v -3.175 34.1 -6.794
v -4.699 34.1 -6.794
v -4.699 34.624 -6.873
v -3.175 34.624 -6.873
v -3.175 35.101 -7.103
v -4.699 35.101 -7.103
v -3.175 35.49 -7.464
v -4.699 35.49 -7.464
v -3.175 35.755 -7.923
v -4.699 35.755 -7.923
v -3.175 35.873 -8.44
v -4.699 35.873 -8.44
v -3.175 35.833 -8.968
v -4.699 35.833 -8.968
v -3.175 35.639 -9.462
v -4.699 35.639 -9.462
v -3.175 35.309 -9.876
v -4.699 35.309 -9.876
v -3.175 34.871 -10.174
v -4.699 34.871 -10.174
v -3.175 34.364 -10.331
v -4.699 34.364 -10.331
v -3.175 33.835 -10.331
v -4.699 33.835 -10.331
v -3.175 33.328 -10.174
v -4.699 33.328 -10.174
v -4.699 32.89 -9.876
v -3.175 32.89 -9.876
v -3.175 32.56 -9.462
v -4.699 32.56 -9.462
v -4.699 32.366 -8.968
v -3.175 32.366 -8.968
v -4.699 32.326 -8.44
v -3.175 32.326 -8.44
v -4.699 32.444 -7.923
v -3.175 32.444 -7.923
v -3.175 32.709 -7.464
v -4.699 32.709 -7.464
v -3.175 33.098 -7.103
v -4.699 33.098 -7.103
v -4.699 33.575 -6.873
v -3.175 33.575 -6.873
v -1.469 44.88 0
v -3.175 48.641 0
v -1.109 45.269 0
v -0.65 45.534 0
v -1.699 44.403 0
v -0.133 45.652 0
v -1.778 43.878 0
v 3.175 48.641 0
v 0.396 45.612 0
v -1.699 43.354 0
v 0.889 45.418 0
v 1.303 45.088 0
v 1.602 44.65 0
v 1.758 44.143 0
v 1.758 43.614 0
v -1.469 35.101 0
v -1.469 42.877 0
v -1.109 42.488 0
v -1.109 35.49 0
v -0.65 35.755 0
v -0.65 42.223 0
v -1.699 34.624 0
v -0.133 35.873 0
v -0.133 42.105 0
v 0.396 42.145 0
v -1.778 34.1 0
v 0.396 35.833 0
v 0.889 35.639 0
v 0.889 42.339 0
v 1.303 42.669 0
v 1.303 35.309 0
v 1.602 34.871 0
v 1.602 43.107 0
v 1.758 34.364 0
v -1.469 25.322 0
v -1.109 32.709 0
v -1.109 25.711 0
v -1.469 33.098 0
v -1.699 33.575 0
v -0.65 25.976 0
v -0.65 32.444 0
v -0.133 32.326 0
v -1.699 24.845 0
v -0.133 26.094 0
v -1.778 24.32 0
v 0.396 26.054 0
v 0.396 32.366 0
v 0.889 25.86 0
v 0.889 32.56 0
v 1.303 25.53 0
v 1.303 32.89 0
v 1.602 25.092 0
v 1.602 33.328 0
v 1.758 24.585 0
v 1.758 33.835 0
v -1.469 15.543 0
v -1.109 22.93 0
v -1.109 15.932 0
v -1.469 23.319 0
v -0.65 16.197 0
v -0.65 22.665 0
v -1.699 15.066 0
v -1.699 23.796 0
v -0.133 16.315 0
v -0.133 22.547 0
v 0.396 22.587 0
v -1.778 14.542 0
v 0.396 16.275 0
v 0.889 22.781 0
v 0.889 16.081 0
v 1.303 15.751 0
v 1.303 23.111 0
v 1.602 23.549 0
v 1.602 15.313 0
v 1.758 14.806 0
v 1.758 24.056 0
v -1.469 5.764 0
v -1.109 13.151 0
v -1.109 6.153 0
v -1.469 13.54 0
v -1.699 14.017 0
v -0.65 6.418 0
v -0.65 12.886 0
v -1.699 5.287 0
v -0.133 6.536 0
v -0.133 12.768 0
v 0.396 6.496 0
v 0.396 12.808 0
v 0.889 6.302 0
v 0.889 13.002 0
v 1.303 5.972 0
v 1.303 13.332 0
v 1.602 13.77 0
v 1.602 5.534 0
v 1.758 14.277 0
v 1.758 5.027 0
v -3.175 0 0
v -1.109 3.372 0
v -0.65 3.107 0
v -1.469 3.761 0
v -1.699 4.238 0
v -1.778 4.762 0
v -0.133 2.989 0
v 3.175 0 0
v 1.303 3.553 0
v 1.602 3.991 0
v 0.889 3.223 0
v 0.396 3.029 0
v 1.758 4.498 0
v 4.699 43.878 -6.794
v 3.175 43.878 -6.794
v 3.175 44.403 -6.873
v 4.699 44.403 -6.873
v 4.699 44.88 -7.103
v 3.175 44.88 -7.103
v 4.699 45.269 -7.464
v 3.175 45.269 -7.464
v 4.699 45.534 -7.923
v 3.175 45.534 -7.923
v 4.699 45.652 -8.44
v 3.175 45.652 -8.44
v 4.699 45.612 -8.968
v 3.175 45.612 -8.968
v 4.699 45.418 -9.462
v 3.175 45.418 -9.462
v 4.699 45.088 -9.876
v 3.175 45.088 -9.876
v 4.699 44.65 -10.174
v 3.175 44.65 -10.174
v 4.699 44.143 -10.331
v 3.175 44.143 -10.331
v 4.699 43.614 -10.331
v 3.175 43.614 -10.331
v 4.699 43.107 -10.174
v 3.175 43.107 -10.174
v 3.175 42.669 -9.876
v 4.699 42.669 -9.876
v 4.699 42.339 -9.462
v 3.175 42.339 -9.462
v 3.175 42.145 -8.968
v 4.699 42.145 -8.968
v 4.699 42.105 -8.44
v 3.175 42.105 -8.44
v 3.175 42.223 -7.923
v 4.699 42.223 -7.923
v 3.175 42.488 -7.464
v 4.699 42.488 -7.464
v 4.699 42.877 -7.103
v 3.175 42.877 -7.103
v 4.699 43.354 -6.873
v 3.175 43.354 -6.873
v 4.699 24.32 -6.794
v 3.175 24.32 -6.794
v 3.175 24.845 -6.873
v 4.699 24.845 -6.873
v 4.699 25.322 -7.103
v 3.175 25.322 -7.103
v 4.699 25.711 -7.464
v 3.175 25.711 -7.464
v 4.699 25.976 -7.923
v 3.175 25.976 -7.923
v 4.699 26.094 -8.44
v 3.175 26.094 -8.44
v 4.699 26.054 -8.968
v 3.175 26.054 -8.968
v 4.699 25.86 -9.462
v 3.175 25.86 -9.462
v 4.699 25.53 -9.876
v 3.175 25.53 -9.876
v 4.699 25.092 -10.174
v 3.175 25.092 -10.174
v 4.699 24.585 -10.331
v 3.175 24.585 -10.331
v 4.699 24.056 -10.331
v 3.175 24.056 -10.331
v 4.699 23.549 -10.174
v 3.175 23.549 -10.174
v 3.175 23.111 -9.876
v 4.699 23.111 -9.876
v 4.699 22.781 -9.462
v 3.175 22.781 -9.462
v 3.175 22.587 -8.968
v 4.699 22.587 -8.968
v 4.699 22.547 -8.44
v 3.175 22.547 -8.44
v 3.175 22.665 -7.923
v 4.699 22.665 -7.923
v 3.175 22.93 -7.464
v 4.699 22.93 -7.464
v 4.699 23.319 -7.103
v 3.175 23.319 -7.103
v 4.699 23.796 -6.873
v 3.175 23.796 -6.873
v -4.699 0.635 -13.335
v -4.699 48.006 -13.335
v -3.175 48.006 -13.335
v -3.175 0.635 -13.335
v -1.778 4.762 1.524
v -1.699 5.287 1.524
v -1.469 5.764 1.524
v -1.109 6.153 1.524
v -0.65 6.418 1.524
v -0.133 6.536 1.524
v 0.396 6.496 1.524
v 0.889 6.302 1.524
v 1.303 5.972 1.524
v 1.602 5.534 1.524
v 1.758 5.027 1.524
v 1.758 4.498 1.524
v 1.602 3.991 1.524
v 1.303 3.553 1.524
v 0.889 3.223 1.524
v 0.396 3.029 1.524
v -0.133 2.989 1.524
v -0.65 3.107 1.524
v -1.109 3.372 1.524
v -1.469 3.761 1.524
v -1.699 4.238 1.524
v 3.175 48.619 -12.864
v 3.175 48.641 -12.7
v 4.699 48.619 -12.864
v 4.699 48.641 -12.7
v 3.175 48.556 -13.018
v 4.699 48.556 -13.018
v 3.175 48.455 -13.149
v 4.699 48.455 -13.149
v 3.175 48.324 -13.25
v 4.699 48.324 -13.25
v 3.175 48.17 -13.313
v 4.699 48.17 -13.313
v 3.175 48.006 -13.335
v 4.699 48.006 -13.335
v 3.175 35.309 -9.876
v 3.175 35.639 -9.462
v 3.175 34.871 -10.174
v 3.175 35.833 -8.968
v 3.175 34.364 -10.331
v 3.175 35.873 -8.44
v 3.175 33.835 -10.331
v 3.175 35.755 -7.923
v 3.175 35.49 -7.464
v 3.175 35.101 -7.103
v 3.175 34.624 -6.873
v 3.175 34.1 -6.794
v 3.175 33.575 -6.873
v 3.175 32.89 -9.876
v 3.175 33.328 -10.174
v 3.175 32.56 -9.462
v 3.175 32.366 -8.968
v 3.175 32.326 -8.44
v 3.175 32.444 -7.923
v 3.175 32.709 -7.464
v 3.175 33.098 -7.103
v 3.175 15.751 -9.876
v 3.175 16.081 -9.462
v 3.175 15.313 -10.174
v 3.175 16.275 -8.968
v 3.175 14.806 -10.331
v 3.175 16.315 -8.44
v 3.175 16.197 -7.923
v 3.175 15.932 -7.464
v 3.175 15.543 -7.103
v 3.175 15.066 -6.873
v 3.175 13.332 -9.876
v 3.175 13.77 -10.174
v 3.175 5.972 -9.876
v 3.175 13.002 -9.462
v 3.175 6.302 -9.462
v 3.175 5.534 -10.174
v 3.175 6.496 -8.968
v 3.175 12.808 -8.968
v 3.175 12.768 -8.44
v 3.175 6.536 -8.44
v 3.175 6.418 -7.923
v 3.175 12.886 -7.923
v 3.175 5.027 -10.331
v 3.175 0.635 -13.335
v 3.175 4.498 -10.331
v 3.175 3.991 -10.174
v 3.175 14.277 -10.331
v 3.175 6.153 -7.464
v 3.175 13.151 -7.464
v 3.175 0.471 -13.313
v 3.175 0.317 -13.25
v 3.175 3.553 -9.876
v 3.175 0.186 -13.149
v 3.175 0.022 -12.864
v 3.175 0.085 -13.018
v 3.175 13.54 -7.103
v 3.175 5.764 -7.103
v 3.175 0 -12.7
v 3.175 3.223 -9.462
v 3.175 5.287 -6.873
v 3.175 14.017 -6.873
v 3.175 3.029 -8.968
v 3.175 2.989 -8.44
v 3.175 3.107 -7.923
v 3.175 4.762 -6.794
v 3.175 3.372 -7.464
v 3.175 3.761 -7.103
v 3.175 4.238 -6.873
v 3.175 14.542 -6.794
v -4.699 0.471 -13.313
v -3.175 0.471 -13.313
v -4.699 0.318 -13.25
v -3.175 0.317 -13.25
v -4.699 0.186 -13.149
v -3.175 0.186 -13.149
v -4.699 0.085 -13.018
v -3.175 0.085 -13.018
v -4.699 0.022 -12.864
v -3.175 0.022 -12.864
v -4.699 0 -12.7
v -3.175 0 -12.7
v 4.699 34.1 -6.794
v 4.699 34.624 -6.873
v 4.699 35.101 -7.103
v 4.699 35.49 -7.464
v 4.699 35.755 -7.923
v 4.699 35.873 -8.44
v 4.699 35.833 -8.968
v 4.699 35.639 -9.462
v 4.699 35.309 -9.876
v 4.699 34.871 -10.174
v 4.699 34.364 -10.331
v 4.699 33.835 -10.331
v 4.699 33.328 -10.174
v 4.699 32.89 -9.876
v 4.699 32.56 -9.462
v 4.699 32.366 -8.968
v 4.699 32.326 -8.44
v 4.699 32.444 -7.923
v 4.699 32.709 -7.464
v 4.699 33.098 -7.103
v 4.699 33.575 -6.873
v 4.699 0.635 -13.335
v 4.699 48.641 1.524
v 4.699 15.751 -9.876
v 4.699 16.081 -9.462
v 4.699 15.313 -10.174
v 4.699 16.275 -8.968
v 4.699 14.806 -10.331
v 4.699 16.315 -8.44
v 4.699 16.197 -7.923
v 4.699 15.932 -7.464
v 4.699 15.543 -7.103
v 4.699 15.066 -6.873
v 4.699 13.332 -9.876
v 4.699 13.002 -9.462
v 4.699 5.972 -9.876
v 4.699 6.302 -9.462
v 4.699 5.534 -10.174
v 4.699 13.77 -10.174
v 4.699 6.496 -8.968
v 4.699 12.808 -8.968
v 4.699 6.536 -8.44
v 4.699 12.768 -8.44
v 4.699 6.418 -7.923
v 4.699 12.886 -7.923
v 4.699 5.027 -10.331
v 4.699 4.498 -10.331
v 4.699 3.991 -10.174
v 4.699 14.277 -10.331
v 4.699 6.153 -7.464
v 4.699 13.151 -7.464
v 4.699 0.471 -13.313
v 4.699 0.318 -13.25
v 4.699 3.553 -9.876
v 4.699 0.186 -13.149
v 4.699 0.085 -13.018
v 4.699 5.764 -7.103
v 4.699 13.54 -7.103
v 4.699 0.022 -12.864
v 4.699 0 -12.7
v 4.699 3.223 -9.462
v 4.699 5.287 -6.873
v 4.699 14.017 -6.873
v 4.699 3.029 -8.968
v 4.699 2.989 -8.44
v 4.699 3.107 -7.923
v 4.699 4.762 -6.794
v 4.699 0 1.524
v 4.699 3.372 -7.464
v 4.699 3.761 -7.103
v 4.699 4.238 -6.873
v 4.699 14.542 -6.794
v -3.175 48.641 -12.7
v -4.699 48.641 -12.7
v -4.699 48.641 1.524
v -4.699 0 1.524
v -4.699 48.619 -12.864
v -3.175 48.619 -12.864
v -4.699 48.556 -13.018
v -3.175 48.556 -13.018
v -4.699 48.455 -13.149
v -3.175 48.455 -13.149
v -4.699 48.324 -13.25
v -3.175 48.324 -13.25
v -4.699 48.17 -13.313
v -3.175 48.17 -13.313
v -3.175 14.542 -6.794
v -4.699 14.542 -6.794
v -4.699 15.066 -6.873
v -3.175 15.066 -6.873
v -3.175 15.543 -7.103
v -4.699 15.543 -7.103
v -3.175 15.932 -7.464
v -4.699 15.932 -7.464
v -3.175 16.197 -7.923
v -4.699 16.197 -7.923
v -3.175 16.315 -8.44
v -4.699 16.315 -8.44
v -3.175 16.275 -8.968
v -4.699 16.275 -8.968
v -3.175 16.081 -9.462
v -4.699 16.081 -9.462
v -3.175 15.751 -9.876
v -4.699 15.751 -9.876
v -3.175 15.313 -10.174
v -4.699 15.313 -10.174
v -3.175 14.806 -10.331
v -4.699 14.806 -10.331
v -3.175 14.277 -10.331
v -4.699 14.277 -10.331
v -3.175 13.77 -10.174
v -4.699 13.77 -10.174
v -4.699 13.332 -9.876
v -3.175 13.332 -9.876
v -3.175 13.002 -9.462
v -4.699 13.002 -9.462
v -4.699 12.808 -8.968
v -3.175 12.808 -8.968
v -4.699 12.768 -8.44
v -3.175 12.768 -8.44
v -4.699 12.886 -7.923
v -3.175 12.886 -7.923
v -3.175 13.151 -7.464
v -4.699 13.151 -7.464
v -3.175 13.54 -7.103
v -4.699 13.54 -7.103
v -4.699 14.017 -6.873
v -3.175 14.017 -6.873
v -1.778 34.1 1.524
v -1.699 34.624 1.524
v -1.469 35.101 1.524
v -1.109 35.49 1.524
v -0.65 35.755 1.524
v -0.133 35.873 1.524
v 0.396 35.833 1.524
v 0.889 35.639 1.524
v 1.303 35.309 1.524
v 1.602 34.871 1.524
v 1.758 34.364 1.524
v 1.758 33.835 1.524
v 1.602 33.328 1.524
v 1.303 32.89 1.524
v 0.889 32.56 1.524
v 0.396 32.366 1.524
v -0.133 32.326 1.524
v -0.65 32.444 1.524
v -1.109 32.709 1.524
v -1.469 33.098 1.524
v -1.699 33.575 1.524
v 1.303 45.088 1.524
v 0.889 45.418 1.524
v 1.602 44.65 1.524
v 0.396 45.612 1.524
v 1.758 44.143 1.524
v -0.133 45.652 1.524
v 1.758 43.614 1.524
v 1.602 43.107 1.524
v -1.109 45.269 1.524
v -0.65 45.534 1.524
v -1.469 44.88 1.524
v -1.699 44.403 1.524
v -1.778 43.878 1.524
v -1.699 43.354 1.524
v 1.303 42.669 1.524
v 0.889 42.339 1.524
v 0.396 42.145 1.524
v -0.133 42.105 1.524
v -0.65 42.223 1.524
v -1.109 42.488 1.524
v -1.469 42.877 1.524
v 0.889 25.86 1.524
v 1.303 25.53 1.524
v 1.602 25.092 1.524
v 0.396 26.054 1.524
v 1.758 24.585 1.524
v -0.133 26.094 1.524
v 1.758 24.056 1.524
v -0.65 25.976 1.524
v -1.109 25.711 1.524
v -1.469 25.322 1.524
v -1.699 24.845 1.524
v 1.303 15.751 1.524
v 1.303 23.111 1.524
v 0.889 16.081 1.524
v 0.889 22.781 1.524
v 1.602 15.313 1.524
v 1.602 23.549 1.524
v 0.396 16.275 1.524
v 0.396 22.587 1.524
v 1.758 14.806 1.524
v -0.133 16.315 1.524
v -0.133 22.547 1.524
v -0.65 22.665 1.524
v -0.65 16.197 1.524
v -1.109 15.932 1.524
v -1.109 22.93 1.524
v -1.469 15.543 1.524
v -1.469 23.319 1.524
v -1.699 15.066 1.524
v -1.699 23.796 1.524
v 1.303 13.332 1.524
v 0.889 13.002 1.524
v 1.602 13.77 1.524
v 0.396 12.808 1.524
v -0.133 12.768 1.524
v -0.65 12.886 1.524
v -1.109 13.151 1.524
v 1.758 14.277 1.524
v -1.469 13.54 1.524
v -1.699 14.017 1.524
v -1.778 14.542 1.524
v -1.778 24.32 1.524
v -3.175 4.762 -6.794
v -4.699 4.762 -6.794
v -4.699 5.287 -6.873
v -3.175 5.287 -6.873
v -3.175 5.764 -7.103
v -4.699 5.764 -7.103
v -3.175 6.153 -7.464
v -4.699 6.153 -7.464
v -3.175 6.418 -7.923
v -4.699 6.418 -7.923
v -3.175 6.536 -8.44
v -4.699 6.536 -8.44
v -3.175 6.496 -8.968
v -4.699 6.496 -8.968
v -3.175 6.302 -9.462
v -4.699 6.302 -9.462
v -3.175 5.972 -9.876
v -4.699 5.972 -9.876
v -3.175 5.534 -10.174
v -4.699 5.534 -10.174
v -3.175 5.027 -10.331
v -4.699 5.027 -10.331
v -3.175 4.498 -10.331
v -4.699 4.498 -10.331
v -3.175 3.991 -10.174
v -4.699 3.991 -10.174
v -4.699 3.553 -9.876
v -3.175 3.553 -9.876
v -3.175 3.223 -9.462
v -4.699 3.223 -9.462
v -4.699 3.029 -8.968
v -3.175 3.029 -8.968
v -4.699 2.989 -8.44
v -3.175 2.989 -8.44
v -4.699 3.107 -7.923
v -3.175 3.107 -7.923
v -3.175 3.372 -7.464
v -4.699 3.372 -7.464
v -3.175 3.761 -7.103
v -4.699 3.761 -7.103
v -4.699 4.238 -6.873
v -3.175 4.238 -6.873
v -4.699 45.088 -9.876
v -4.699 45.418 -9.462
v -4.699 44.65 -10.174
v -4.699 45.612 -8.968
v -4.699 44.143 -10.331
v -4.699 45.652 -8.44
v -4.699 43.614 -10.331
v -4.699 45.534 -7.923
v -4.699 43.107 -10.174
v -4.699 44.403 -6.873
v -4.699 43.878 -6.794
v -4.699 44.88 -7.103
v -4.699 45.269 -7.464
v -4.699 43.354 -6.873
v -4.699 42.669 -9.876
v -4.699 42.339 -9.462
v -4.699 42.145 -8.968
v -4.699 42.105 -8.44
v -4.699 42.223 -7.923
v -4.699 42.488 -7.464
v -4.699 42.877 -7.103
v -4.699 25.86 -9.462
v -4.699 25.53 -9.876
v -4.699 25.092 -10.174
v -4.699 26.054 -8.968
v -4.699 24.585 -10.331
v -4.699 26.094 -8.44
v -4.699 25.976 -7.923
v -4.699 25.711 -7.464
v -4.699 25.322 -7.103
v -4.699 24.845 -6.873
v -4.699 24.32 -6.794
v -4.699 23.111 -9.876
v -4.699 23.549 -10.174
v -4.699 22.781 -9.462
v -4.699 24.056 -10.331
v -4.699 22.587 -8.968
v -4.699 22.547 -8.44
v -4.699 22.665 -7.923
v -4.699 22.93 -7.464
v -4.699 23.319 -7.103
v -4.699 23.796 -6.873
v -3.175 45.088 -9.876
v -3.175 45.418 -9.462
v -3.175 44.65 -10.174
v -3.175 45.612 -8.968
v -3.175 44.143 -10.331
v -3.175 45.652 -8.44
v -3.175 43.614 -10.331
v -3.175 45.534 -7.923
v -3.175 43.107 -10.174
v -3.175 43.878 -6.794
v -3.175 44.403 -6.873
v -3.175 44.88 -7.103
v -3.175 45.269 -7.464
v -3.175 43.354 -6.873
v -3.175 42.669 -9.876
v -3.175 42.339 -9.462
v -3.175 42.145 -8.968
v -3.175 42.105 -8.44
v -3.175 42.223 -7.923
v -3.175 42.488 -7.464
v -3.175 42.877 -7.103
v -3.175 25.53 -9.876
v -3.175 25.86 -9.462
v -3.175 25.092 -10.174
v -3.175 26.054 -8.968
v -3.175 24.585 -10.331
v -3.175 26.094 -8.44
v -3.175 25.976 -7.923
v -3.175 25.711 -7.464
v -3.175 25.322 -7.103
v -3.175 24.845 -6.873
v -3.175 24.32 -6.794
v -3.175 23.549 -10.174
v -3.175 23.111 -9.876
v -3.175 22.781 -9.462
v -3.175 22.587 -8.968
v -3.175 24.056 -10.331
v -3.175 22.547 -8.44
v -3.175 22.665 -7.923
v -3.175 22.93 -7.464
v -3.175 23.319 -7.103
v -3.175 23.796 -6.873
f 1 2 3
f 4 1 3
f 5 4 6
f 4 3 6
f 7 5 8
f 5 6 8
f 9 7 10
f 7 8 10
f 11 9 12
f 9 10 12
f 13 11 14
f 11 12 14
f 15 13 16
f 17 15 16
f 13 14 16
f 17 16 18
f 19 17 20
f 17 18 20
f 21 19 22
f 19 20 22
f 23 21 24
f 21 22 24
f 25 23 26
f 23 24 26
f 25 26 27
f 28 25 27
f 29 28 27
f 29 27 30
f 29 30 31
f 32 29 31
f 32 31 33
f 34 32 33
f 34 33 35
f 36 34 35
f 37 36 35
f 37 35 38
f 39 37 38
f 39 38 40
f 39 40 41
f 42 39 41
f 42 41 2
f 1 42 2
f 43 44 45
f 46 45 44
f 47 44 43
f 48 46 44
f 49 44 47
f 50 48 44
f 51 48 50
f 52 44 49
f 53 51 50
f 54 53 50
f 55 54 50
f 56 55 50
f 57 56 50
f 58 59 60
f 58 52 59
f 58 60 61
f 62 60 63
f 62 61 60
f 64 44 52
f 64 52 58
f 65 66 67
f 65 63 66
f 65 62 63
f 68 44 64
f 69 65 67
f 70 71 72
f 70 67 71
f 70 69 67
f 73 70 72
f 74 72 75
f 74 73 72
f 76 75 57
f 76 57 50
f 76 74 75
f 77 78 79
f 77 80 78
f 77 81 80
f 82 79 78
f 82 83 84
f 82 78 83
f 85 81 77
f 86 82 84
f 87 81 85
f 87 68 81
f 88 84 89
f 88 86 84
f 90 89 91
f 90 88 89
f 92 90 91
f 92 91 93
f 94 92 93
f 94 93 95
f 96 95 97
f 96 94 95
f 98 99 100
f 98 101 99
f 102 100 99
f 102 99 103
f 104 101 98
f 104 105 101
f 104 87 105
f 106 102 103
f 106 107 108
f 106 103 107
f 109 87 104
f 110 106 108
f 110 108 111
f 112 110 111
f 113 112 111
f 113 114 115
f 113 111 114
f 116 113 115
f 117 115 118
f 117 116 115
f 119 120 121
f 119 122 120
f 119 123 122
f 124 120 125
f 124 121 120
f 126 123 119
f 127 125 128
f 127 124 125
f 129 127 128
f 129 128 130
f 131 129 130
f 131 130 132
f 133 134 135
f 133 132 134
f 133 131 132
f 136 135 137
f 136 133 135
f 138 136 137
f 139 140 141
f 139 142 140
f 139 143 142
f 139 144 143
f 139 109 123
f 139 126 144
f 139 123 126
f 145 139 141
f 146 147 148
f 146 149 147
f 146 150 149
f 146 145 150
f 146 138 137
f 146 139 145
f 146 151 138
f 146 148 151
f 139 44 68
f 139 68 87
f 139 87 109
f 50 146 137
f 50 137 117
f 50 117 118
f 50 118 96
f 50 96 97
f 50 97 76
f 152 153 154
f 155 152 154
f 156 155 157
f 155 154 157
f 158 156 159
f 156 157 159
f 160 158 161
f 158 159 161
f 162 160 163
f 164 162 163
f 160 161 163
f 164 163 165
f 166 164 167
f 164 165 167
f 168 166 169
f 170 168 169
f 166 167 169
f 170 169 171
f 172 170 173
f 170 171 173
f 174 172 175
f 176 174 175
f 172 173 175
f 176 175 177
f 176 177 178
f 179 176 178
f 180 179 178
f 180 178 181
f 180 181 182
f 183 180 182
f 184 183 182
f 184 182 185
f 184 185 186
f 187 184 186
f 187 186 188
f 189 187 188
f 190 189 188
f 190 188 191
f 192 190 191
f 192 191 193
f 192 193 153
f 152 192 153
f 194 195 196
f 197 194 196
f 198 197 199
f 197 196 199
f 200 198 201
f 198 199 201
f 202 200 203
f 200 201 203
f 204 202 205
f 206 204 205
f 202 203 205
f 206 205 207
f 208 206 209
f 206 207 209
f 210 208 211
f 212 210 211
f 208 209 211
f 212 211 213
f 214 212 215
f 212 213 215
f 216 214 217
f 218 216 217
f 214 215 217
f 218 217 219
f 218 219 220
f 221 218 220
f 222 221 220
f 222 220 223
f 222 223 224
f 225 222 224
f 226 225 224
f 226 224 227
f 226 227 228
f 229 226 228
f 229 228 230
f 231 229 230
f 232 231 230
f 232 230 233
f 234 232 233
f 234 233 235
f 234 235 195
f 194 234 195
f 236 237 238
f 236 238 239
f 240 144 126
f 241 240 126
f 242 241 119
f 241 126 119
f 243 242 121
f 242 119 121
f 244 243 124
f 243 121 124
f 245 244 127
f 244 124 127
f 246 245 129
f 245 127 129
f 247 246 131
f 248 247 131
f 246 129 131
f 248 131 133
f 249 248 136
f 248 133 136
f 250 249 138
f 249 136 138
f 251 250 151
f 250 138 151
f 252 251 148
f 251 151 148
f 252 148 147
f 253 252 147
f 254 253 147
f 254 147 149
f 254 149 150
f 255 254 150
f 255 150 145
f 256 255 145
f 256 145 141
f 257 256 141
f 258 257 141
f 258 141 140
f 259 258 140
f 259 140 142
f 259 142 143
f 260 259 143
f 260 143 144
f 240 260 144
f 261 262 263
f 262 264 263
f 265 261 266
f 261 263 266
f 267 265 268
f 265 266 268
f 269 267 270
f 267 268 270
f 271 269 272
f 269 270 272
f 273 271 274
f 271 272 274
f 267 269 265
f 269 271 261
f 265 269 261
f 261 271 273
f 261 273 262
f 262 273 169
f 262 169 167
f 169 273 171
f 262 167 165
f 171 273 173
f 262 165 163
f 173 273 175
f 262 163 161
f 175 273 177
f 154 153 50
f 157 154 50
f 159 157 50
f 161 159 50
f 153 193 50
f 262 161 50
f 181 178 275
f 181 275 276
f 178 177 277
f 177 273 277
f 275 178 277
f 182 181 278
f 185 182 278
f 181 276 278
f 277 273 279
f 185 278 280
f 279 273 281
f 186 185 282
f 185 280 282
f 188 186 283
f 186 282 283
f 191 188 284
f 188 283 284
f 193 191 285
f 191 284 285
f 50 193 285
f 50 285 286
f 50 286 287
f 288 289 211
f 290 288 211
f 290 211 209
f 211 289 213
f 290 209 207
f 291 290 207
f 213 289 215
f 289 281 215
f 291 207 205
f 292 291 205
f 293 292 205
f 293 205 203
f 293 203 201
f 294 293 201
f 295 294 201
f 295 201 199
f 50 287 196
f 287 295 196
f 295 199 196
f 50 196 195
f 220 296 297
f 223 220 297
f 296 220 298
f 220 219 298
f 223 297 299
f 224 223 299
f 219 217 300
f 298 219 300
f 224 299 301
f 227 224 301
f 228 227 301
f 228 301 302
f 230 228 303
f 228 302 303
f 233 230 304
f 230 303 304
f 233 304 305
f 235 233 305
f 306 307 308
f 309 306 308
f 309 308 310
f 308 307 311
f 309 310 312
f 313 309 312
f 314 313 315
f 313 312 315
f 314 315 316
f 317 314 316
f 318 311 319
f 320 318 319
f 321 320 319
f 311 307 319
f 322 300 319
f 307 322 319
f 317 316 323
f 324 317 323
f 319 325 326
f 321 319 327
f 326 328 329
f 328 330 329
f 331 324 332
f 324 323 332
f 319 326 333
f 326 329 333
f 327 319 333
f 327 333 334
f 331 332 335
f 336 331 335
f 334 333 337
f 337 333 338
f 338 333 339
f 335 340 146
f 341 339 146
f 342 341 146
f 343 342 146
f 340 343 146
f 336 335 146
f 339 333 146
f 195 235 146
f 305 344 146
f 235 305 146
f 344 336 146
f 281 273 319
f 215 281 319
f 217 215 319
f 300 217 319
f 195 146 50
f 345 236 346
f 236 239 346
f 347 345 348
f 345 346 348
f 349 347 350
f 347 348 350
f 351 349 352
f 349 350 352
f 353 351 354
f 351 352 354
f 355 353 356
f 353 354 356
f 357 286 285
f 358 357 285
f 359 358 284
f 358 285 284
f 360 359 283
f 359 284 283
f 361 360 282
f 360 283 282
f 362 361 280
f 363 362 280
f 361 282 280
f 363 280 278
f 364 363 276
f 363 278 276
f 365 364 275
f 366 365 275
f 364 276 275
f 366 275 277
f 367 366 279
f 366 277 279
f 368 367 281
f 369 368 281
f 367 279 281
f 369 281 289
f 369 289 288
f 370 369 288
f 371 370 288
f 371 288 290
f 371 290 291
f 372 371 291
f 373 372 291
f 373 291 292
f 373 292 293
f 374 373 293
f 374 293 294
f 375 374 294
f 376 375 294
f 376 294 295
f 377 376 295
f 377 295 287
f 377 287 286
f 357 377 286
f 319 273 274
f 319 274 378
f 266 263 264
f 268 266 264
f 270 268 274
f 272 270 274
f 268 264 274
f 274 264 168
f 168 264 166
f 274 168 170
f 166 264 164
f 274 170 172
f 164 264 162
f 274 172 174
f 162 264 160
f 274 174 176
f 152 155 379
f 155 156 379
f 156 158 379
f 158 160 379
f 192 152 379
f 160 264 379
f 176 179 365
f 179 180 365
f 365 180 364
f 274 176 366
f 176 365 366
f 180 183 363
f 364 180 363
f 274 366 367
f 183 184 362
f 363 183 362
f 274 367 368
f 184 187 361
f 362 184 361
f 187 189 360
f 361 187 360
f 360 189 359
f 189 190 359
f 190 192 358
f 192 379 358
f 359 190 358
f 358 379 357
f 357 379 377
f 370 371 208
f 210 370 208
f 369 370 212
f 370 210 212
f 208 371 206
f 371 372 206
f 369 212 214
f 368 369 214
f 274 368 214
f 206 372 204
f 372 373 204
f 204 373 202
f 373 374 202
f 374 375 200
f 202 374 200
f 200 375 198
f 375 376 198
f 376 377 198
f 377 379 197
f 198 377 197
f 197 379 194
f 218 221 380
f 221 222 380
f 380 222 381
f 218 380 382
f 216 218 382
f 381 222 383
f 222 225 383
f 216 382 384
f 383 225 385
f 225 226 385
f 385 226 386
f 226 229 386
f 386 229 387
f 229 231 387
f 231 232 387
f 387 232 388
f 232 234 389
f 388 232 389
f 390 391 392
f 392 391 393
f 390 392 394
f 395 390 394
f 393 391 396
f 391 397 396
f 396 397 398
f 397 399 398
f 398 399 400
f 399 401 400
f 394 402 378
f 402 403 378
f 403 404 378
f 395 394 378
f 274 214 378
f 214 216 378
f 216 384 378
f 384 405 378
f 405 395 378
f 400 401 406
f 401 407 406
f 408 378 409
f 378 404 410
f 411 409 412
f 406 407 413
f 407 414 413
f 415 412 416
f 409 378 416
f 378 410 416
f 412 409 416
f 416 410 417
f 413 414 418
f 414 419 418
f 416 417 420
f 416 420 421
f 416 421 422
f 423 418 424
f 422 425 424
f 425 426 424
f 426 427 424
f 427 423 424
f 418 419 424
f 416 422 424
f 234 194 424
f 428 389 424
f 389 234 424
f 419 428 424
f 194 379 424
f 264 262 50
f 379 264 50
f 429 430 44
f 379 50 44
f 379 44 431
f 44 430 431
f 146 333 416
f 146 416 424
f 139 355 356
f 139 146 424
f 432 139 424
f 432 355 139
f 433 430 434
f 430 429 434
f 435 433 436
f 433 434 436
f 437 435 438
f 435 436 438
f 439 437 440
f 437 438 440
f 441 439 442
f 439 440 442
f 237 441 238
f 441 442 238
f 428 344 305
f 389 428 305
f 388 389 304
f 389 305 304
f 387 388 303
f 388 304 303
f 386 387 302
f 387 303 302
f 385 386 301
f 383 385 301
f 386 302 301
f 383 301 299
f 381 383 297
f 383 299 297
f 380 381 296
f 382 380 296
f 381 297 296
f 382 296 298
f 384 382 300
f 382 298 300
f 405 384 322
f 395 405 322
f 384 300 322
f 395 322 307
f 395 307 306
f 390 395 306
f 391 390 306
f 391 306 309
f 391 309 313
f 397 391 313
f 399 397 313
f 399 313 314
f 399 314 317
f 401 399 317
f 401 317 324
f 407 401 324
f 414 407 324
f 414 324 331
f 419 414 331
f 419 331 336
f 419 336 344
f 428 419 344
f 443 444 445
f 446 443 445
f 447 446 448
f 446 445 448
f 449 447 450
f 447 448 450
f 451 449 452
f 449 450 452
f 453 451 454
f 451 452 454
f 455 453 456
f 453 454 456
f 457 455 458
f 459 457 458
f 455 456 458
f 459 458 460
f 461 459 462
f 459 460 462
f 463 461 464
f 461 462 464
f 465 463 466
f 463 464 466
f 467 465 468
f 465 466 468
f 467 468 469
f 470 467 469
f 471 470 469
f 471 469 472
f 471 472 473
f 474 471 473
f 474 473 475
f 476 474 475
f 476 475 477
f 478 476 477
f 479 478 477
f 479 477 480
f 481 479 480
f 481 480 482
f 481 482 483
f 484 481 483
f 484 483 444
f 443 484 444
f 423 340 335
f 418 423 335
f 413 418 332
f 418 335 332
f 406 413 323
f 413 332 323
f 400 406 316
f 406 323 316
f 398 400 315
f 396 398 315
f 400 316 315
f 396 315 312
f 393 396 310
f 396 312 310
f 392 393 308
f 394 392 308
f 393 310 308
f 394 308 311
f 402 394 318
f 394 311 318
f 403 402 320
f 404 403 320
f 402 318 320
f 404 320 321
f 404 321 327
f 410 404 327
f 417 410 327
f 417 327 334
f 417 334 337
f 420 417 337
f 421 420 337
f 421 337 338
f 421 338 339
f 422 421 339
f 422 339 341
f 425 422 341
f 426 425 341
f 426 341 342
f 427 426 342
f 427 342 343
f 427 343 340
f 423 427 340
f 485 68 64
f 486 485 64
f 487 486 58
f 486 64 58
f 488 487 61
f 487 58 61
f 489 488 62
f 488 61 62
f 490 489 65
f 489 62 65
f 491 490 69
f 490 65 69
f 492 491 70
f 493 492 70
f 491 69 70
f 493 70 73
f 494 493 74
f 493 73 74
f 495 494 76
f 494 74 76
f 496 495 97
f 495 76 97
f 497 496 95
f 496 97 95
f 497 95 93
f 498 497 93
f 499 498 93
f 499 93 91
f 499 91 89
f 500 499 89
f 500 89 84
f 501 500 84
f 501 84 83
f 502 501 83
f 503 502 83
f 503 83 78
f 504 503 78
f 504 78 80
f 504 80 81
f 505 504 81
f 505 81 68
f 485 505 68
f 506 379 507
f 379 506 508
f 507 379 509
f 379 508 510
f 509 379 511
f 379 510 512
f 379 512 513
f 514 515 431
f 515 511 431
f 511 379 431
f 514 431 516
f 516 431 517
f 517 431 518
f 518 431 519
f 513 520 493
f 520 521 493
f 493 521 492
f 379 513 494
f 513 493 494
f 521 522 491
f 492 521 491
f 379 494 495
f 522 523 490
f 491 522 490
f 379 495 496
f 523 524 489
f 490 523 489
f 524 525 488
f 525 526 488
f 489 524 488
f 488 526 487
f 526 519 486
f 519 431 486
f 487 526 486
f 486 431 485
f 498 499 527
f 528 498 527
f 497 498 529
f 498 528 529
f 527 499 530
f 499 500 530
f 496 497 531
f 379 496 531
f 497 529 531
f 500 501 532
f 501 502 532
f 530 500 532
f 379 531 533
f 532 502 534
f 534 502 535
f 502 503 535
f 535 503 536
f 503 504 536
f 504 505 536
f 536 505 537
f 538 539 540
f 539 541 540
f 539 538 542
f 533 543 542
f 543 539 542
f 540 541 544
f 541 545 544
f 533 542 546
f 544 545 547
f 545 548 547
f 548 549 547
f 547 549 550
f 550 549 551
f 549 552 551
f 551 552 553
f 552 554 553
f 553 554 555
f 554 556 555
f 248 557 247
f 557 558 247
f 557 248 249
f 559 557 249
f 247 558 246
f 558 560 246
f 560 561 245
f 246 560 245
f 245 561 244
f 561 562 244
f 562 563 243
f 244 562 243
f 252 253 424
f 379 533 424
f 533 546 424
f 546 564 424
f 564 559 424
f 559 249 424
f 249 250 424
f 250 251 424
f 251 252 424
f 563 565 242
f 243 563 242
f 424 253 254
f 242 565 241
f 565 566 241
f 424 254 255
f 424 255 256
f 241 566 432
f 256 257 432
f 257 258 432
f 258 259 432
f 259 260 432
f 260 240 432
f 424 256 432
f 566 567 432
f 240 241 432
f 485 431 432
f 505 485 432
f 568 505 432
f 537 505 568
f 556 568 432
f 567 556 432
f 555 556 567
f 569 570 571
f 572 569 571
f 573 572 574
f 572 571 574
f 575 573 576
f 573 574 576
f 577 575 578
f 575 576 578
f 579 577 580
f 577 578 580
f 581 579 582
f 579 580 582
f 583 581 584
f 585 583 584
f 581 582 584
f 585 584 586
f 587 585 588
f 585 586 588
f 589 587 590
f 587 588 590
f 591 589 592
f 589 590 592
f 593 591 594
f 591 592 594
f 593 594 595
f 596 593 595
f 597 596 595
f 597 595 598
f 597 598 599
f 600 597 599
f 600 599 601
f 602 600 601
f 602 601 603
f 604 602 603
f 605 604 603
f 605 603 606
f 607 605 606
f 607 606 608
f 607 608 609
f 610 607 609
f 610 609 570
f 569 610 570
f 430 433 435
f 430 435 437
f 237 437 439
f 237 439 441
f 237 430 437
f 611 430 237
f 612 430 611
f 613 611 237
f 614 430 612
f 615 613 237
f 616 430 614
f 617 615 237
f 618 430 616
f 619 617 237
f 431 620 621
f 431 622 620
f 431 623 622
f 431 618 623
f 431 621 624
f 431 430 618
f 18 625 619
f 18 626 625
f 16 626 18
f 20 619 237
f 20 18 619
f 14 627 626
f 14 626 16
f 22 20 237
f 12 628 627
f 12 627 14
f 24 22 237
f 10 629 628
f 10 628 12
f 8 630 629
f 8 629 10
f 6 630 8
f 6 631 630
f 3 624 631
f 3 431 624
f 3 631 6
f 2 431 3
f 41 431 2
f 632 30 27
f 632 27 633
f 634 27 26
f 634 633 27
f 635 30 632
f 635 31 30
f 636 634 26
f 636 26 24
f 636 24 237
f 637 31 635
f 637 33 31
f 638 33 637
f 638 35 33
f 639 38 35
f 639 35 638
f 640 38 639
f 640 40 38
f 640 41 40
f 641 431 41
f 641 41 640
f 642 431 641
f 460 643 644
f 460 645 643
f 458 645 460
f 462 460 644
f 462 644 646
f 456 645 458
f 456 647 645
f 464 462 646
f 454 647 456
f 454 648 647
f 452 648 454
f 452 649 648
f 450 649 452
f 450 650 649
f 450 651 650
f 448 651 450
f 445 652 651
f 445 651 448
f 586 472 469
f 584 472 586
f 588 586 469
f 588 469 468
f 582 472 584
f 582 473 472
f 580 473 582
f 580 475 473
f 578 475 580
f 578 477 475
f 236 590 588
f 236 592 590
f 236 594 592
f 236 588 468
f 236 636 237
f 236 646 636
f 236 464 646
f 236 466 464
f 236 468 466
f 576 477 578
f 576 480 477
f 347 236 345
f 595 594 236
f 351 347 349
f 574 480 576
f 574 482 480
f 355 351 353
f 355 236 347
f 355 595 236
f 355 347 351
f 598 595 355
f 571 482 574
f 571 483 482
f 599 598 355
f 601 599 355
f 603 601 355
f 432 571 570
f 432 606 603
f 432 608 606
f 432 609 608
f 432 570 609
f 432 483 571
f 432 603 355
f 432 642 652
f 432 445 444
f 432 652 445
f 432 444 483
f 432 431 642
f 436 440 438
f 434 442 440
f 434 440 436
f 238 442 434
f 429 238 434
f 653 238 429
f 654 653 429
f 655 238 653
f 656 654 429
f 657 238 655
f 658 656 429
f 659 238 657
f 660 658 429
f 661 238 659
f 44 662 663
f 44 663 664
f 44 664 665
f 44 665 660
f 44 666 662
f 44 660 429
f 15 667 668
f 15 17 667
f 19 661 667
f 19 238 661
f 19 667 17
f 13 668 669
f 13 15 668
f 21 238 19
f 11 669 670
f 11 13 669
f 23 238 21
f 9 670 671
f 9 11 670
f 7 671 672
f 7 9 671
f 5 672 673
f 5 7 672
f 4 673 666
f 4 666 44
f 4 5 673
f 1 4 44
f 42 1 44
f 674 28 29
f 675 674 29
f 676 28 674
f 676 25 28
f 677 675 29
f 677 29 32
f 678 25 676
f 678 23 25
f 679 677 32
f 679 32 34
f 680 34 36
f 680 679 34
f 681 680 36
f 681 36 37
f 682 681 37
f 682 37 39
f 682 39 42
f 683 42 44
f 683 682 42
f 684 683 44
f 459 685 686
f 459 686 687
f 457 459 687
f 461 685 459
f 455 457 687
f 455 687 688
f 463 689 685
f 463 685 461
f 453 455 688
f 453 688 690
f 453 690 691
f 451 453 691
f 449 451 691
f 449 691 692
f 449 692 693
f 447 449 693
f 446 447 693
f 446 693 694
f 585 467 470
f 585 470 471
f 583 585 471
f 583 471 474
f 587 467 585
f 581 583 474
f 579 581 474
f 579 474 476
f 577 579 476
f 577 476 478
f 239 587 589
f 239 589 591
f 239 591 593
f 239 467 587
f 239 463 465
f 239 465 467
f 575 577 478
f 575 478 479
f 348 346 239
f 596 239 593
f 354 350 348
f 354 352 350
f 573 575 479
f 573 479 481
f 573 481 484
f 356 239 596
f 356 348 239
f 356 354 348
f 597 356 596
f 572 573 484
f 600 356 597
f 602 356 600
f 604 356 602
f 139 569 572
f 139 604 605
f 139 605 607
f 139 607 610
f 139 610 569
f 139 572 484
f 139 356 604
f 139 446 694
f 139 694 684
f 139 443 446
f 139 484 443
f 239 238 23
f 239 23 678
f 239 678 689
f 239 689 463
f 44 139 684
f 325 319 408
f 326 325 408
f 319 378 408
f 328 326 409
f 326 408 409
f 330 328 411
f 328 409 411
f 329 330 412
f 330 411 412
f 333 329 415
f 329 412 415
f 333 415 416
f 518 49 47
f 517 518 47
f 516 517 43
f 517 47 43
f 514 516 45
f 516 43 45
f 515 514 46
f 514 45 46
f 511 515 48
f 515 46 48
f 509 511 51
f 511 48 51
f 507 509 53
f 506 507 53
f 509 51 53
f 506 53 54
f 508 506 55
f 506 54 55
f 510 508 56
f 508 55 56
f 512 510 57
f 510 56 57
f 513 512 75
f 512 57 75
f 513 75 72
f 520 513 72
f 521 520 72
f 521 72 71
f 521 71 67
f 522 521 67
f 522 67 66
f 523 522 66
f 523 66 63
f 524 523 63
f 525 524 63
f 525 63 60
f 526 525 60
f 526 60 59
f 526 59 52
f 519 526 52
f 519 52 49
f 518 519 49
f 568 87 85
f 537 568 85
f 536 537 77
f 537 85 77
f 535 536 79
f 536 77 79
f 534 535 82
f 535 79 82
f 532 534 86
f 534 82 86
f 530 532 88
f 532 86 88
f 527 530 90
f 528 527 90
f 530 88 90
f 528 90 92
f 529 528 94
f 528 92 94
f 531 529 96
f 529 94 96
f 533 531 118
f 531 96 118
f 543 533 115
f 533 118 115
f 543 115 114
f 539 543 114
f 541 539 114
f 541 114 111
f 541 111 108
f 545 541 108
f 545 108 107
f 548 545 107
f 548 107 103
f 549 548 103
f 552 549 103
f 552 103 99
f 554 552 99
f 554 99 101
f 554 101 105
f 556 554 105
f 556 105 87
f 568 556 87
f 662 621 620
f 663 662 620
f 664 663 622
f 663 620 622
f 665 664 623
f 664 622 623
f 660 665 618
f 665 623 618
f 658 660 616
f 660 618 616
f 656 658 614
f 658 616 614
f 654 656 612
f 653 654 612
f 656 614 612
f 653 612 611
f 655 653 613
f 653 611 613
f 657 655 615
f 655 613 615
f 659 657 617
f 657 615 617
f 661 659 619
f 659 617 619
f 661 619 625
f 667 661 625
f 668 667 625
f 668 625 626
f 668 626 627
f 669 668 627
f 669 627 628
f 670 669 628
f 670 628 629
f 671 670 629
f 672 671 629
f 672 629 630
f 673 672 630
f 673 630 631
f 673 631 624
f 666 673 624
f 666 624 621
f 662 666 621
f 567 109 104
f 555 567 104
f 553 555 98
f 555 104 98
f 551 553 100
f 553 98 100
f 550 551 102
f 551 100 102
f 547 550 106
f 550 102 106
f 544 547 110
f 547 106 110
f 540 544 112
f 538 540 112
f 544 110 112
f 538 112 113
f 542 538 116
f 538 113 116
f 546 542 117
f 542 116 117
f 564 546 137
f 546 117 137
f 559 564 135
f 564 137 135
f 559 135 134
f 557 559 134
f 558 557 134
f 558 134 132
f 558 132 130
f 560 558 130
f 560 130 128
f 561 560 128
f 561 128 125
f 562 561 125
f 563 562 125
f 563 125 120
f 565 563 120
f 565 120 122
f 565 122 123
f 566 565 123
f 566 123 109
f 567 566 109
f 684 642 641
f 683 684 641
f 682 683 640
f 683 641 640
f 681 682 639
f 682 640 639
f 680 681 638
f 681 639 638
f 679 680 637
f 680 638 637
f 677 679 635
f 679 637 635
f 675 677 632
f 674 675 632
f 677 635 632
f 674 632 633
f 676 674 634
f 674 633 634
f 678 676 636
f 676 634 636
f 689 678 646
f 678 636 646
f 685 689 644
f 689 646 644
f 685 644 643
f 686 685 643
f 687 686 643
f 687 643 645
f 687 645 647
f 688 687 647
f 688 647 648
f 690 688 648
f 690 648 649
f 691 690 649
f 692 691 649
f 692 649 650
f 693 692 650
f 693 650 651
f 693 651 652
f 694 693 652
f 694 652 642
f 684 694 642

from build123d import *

# Parameters (mm, degrees)
SKETCH1_W                 = 48.641
SKETCH1_H                 = 14.859
BOSS_EXTRUDE1_DEPTH       = 9.398
SKETCH2_W                 = 6.35
SKETCH2_H                 = 13.335
CUT_EXTRUDE1_DEPTH        = 51.65421707
F_5_CLEARANCE_HOLE1_D     = 3.556
F_5_CLEARANCE_HOLE1_DEPTH = 1.524
F_5_CLEARANCE_HOLE2_D     = 3.556
F_5_CLEARANCE_HOLE2_DEPTH = 14.859
F_5_CLEARANCE_HOLE3_D     = 3.556
FILLET1_R                 = 0.635


with BuildPart() as part:
    # Sketch1 → Boss-Extrude1 (new body)
    with BuildSketch(Plane(origin=(-4.699, 0, 0), x_dir=(0, -1, 0), z_dir=(-1, 0, 0))):
        with Locations((-24.3205, -5.9055)):
            Rectangle(SKETCH1_W, SKETCH1_H)
    extrude(amount=-BOSS_EXTRUDE1_DEPTH)

    # Sketch2 → Cut-Extrude1 (cut, through all)
    with BuildSketch(Plane.XZ):
        with Locations((0, -6.6675)):
            Rectangle(SKETCH2_W, SKETCH2_H)
    extrude(amount=-CUT_EXTRUDE1_DEPTH, mode=Mode.SUBTRACT)

    # #5 Clearance Hole1
    with Locations(Plane(origin=(4.699, 0, 0), x_dir=(0, 0, -1), z_dir=(1, 0, 0))):
        with Locations((8.5725, 34.0995), (8.5725, 43.8785), (8.5725, 24.3205), (8.5725, 14.5415), (8.5725, 4.7625)):
            Hole(F_5_CLEARANCE_HOLE1_D / 2, depth=F_5_CLEARANCE_HOLE1_DEPTH)

    # #5 Clearance Hole2
    with Locations(Plane.XY.offset(1.524)):
        with Locations((0, 34.0995), (0, 43.8785), (0, 24.3205), (0, 14.5415), (0, 4.7625)):
            Hole(F_5_CLEARANCE_HOLE2_D / 2, depth=F_5_CLEARANCE_HOLE2_DEPTH)

    # #5 Clearance Hole3 (through all)
    with Locations(Plane(origin=(-3.175, 0, 0), x_dir=(0, 0, -1), z_dir=(1, 0, 0))):
        with Locations((8.5725, 34.0995), (8.5725, 43.8785), (8.5725, 24.3205), (8.5725, 14.5415), (8.5725, 4.7625)):
            Hole(F_5_CLEARANCE_HOLE3_D / 2)

    # Fillet1
    fillet1_edges = [part.edges().sort_by_distance(p)[0] for p in [
        (-3.937, 48.641, -13.335),
        (-3.937, 0, -13.335),
        (3.937, 0, -13.335),
        (3.937, 48.641, -13.335),
    ]]
    fillet(fillet1_edges, radius=FILLET1_R)


solid = part.part
